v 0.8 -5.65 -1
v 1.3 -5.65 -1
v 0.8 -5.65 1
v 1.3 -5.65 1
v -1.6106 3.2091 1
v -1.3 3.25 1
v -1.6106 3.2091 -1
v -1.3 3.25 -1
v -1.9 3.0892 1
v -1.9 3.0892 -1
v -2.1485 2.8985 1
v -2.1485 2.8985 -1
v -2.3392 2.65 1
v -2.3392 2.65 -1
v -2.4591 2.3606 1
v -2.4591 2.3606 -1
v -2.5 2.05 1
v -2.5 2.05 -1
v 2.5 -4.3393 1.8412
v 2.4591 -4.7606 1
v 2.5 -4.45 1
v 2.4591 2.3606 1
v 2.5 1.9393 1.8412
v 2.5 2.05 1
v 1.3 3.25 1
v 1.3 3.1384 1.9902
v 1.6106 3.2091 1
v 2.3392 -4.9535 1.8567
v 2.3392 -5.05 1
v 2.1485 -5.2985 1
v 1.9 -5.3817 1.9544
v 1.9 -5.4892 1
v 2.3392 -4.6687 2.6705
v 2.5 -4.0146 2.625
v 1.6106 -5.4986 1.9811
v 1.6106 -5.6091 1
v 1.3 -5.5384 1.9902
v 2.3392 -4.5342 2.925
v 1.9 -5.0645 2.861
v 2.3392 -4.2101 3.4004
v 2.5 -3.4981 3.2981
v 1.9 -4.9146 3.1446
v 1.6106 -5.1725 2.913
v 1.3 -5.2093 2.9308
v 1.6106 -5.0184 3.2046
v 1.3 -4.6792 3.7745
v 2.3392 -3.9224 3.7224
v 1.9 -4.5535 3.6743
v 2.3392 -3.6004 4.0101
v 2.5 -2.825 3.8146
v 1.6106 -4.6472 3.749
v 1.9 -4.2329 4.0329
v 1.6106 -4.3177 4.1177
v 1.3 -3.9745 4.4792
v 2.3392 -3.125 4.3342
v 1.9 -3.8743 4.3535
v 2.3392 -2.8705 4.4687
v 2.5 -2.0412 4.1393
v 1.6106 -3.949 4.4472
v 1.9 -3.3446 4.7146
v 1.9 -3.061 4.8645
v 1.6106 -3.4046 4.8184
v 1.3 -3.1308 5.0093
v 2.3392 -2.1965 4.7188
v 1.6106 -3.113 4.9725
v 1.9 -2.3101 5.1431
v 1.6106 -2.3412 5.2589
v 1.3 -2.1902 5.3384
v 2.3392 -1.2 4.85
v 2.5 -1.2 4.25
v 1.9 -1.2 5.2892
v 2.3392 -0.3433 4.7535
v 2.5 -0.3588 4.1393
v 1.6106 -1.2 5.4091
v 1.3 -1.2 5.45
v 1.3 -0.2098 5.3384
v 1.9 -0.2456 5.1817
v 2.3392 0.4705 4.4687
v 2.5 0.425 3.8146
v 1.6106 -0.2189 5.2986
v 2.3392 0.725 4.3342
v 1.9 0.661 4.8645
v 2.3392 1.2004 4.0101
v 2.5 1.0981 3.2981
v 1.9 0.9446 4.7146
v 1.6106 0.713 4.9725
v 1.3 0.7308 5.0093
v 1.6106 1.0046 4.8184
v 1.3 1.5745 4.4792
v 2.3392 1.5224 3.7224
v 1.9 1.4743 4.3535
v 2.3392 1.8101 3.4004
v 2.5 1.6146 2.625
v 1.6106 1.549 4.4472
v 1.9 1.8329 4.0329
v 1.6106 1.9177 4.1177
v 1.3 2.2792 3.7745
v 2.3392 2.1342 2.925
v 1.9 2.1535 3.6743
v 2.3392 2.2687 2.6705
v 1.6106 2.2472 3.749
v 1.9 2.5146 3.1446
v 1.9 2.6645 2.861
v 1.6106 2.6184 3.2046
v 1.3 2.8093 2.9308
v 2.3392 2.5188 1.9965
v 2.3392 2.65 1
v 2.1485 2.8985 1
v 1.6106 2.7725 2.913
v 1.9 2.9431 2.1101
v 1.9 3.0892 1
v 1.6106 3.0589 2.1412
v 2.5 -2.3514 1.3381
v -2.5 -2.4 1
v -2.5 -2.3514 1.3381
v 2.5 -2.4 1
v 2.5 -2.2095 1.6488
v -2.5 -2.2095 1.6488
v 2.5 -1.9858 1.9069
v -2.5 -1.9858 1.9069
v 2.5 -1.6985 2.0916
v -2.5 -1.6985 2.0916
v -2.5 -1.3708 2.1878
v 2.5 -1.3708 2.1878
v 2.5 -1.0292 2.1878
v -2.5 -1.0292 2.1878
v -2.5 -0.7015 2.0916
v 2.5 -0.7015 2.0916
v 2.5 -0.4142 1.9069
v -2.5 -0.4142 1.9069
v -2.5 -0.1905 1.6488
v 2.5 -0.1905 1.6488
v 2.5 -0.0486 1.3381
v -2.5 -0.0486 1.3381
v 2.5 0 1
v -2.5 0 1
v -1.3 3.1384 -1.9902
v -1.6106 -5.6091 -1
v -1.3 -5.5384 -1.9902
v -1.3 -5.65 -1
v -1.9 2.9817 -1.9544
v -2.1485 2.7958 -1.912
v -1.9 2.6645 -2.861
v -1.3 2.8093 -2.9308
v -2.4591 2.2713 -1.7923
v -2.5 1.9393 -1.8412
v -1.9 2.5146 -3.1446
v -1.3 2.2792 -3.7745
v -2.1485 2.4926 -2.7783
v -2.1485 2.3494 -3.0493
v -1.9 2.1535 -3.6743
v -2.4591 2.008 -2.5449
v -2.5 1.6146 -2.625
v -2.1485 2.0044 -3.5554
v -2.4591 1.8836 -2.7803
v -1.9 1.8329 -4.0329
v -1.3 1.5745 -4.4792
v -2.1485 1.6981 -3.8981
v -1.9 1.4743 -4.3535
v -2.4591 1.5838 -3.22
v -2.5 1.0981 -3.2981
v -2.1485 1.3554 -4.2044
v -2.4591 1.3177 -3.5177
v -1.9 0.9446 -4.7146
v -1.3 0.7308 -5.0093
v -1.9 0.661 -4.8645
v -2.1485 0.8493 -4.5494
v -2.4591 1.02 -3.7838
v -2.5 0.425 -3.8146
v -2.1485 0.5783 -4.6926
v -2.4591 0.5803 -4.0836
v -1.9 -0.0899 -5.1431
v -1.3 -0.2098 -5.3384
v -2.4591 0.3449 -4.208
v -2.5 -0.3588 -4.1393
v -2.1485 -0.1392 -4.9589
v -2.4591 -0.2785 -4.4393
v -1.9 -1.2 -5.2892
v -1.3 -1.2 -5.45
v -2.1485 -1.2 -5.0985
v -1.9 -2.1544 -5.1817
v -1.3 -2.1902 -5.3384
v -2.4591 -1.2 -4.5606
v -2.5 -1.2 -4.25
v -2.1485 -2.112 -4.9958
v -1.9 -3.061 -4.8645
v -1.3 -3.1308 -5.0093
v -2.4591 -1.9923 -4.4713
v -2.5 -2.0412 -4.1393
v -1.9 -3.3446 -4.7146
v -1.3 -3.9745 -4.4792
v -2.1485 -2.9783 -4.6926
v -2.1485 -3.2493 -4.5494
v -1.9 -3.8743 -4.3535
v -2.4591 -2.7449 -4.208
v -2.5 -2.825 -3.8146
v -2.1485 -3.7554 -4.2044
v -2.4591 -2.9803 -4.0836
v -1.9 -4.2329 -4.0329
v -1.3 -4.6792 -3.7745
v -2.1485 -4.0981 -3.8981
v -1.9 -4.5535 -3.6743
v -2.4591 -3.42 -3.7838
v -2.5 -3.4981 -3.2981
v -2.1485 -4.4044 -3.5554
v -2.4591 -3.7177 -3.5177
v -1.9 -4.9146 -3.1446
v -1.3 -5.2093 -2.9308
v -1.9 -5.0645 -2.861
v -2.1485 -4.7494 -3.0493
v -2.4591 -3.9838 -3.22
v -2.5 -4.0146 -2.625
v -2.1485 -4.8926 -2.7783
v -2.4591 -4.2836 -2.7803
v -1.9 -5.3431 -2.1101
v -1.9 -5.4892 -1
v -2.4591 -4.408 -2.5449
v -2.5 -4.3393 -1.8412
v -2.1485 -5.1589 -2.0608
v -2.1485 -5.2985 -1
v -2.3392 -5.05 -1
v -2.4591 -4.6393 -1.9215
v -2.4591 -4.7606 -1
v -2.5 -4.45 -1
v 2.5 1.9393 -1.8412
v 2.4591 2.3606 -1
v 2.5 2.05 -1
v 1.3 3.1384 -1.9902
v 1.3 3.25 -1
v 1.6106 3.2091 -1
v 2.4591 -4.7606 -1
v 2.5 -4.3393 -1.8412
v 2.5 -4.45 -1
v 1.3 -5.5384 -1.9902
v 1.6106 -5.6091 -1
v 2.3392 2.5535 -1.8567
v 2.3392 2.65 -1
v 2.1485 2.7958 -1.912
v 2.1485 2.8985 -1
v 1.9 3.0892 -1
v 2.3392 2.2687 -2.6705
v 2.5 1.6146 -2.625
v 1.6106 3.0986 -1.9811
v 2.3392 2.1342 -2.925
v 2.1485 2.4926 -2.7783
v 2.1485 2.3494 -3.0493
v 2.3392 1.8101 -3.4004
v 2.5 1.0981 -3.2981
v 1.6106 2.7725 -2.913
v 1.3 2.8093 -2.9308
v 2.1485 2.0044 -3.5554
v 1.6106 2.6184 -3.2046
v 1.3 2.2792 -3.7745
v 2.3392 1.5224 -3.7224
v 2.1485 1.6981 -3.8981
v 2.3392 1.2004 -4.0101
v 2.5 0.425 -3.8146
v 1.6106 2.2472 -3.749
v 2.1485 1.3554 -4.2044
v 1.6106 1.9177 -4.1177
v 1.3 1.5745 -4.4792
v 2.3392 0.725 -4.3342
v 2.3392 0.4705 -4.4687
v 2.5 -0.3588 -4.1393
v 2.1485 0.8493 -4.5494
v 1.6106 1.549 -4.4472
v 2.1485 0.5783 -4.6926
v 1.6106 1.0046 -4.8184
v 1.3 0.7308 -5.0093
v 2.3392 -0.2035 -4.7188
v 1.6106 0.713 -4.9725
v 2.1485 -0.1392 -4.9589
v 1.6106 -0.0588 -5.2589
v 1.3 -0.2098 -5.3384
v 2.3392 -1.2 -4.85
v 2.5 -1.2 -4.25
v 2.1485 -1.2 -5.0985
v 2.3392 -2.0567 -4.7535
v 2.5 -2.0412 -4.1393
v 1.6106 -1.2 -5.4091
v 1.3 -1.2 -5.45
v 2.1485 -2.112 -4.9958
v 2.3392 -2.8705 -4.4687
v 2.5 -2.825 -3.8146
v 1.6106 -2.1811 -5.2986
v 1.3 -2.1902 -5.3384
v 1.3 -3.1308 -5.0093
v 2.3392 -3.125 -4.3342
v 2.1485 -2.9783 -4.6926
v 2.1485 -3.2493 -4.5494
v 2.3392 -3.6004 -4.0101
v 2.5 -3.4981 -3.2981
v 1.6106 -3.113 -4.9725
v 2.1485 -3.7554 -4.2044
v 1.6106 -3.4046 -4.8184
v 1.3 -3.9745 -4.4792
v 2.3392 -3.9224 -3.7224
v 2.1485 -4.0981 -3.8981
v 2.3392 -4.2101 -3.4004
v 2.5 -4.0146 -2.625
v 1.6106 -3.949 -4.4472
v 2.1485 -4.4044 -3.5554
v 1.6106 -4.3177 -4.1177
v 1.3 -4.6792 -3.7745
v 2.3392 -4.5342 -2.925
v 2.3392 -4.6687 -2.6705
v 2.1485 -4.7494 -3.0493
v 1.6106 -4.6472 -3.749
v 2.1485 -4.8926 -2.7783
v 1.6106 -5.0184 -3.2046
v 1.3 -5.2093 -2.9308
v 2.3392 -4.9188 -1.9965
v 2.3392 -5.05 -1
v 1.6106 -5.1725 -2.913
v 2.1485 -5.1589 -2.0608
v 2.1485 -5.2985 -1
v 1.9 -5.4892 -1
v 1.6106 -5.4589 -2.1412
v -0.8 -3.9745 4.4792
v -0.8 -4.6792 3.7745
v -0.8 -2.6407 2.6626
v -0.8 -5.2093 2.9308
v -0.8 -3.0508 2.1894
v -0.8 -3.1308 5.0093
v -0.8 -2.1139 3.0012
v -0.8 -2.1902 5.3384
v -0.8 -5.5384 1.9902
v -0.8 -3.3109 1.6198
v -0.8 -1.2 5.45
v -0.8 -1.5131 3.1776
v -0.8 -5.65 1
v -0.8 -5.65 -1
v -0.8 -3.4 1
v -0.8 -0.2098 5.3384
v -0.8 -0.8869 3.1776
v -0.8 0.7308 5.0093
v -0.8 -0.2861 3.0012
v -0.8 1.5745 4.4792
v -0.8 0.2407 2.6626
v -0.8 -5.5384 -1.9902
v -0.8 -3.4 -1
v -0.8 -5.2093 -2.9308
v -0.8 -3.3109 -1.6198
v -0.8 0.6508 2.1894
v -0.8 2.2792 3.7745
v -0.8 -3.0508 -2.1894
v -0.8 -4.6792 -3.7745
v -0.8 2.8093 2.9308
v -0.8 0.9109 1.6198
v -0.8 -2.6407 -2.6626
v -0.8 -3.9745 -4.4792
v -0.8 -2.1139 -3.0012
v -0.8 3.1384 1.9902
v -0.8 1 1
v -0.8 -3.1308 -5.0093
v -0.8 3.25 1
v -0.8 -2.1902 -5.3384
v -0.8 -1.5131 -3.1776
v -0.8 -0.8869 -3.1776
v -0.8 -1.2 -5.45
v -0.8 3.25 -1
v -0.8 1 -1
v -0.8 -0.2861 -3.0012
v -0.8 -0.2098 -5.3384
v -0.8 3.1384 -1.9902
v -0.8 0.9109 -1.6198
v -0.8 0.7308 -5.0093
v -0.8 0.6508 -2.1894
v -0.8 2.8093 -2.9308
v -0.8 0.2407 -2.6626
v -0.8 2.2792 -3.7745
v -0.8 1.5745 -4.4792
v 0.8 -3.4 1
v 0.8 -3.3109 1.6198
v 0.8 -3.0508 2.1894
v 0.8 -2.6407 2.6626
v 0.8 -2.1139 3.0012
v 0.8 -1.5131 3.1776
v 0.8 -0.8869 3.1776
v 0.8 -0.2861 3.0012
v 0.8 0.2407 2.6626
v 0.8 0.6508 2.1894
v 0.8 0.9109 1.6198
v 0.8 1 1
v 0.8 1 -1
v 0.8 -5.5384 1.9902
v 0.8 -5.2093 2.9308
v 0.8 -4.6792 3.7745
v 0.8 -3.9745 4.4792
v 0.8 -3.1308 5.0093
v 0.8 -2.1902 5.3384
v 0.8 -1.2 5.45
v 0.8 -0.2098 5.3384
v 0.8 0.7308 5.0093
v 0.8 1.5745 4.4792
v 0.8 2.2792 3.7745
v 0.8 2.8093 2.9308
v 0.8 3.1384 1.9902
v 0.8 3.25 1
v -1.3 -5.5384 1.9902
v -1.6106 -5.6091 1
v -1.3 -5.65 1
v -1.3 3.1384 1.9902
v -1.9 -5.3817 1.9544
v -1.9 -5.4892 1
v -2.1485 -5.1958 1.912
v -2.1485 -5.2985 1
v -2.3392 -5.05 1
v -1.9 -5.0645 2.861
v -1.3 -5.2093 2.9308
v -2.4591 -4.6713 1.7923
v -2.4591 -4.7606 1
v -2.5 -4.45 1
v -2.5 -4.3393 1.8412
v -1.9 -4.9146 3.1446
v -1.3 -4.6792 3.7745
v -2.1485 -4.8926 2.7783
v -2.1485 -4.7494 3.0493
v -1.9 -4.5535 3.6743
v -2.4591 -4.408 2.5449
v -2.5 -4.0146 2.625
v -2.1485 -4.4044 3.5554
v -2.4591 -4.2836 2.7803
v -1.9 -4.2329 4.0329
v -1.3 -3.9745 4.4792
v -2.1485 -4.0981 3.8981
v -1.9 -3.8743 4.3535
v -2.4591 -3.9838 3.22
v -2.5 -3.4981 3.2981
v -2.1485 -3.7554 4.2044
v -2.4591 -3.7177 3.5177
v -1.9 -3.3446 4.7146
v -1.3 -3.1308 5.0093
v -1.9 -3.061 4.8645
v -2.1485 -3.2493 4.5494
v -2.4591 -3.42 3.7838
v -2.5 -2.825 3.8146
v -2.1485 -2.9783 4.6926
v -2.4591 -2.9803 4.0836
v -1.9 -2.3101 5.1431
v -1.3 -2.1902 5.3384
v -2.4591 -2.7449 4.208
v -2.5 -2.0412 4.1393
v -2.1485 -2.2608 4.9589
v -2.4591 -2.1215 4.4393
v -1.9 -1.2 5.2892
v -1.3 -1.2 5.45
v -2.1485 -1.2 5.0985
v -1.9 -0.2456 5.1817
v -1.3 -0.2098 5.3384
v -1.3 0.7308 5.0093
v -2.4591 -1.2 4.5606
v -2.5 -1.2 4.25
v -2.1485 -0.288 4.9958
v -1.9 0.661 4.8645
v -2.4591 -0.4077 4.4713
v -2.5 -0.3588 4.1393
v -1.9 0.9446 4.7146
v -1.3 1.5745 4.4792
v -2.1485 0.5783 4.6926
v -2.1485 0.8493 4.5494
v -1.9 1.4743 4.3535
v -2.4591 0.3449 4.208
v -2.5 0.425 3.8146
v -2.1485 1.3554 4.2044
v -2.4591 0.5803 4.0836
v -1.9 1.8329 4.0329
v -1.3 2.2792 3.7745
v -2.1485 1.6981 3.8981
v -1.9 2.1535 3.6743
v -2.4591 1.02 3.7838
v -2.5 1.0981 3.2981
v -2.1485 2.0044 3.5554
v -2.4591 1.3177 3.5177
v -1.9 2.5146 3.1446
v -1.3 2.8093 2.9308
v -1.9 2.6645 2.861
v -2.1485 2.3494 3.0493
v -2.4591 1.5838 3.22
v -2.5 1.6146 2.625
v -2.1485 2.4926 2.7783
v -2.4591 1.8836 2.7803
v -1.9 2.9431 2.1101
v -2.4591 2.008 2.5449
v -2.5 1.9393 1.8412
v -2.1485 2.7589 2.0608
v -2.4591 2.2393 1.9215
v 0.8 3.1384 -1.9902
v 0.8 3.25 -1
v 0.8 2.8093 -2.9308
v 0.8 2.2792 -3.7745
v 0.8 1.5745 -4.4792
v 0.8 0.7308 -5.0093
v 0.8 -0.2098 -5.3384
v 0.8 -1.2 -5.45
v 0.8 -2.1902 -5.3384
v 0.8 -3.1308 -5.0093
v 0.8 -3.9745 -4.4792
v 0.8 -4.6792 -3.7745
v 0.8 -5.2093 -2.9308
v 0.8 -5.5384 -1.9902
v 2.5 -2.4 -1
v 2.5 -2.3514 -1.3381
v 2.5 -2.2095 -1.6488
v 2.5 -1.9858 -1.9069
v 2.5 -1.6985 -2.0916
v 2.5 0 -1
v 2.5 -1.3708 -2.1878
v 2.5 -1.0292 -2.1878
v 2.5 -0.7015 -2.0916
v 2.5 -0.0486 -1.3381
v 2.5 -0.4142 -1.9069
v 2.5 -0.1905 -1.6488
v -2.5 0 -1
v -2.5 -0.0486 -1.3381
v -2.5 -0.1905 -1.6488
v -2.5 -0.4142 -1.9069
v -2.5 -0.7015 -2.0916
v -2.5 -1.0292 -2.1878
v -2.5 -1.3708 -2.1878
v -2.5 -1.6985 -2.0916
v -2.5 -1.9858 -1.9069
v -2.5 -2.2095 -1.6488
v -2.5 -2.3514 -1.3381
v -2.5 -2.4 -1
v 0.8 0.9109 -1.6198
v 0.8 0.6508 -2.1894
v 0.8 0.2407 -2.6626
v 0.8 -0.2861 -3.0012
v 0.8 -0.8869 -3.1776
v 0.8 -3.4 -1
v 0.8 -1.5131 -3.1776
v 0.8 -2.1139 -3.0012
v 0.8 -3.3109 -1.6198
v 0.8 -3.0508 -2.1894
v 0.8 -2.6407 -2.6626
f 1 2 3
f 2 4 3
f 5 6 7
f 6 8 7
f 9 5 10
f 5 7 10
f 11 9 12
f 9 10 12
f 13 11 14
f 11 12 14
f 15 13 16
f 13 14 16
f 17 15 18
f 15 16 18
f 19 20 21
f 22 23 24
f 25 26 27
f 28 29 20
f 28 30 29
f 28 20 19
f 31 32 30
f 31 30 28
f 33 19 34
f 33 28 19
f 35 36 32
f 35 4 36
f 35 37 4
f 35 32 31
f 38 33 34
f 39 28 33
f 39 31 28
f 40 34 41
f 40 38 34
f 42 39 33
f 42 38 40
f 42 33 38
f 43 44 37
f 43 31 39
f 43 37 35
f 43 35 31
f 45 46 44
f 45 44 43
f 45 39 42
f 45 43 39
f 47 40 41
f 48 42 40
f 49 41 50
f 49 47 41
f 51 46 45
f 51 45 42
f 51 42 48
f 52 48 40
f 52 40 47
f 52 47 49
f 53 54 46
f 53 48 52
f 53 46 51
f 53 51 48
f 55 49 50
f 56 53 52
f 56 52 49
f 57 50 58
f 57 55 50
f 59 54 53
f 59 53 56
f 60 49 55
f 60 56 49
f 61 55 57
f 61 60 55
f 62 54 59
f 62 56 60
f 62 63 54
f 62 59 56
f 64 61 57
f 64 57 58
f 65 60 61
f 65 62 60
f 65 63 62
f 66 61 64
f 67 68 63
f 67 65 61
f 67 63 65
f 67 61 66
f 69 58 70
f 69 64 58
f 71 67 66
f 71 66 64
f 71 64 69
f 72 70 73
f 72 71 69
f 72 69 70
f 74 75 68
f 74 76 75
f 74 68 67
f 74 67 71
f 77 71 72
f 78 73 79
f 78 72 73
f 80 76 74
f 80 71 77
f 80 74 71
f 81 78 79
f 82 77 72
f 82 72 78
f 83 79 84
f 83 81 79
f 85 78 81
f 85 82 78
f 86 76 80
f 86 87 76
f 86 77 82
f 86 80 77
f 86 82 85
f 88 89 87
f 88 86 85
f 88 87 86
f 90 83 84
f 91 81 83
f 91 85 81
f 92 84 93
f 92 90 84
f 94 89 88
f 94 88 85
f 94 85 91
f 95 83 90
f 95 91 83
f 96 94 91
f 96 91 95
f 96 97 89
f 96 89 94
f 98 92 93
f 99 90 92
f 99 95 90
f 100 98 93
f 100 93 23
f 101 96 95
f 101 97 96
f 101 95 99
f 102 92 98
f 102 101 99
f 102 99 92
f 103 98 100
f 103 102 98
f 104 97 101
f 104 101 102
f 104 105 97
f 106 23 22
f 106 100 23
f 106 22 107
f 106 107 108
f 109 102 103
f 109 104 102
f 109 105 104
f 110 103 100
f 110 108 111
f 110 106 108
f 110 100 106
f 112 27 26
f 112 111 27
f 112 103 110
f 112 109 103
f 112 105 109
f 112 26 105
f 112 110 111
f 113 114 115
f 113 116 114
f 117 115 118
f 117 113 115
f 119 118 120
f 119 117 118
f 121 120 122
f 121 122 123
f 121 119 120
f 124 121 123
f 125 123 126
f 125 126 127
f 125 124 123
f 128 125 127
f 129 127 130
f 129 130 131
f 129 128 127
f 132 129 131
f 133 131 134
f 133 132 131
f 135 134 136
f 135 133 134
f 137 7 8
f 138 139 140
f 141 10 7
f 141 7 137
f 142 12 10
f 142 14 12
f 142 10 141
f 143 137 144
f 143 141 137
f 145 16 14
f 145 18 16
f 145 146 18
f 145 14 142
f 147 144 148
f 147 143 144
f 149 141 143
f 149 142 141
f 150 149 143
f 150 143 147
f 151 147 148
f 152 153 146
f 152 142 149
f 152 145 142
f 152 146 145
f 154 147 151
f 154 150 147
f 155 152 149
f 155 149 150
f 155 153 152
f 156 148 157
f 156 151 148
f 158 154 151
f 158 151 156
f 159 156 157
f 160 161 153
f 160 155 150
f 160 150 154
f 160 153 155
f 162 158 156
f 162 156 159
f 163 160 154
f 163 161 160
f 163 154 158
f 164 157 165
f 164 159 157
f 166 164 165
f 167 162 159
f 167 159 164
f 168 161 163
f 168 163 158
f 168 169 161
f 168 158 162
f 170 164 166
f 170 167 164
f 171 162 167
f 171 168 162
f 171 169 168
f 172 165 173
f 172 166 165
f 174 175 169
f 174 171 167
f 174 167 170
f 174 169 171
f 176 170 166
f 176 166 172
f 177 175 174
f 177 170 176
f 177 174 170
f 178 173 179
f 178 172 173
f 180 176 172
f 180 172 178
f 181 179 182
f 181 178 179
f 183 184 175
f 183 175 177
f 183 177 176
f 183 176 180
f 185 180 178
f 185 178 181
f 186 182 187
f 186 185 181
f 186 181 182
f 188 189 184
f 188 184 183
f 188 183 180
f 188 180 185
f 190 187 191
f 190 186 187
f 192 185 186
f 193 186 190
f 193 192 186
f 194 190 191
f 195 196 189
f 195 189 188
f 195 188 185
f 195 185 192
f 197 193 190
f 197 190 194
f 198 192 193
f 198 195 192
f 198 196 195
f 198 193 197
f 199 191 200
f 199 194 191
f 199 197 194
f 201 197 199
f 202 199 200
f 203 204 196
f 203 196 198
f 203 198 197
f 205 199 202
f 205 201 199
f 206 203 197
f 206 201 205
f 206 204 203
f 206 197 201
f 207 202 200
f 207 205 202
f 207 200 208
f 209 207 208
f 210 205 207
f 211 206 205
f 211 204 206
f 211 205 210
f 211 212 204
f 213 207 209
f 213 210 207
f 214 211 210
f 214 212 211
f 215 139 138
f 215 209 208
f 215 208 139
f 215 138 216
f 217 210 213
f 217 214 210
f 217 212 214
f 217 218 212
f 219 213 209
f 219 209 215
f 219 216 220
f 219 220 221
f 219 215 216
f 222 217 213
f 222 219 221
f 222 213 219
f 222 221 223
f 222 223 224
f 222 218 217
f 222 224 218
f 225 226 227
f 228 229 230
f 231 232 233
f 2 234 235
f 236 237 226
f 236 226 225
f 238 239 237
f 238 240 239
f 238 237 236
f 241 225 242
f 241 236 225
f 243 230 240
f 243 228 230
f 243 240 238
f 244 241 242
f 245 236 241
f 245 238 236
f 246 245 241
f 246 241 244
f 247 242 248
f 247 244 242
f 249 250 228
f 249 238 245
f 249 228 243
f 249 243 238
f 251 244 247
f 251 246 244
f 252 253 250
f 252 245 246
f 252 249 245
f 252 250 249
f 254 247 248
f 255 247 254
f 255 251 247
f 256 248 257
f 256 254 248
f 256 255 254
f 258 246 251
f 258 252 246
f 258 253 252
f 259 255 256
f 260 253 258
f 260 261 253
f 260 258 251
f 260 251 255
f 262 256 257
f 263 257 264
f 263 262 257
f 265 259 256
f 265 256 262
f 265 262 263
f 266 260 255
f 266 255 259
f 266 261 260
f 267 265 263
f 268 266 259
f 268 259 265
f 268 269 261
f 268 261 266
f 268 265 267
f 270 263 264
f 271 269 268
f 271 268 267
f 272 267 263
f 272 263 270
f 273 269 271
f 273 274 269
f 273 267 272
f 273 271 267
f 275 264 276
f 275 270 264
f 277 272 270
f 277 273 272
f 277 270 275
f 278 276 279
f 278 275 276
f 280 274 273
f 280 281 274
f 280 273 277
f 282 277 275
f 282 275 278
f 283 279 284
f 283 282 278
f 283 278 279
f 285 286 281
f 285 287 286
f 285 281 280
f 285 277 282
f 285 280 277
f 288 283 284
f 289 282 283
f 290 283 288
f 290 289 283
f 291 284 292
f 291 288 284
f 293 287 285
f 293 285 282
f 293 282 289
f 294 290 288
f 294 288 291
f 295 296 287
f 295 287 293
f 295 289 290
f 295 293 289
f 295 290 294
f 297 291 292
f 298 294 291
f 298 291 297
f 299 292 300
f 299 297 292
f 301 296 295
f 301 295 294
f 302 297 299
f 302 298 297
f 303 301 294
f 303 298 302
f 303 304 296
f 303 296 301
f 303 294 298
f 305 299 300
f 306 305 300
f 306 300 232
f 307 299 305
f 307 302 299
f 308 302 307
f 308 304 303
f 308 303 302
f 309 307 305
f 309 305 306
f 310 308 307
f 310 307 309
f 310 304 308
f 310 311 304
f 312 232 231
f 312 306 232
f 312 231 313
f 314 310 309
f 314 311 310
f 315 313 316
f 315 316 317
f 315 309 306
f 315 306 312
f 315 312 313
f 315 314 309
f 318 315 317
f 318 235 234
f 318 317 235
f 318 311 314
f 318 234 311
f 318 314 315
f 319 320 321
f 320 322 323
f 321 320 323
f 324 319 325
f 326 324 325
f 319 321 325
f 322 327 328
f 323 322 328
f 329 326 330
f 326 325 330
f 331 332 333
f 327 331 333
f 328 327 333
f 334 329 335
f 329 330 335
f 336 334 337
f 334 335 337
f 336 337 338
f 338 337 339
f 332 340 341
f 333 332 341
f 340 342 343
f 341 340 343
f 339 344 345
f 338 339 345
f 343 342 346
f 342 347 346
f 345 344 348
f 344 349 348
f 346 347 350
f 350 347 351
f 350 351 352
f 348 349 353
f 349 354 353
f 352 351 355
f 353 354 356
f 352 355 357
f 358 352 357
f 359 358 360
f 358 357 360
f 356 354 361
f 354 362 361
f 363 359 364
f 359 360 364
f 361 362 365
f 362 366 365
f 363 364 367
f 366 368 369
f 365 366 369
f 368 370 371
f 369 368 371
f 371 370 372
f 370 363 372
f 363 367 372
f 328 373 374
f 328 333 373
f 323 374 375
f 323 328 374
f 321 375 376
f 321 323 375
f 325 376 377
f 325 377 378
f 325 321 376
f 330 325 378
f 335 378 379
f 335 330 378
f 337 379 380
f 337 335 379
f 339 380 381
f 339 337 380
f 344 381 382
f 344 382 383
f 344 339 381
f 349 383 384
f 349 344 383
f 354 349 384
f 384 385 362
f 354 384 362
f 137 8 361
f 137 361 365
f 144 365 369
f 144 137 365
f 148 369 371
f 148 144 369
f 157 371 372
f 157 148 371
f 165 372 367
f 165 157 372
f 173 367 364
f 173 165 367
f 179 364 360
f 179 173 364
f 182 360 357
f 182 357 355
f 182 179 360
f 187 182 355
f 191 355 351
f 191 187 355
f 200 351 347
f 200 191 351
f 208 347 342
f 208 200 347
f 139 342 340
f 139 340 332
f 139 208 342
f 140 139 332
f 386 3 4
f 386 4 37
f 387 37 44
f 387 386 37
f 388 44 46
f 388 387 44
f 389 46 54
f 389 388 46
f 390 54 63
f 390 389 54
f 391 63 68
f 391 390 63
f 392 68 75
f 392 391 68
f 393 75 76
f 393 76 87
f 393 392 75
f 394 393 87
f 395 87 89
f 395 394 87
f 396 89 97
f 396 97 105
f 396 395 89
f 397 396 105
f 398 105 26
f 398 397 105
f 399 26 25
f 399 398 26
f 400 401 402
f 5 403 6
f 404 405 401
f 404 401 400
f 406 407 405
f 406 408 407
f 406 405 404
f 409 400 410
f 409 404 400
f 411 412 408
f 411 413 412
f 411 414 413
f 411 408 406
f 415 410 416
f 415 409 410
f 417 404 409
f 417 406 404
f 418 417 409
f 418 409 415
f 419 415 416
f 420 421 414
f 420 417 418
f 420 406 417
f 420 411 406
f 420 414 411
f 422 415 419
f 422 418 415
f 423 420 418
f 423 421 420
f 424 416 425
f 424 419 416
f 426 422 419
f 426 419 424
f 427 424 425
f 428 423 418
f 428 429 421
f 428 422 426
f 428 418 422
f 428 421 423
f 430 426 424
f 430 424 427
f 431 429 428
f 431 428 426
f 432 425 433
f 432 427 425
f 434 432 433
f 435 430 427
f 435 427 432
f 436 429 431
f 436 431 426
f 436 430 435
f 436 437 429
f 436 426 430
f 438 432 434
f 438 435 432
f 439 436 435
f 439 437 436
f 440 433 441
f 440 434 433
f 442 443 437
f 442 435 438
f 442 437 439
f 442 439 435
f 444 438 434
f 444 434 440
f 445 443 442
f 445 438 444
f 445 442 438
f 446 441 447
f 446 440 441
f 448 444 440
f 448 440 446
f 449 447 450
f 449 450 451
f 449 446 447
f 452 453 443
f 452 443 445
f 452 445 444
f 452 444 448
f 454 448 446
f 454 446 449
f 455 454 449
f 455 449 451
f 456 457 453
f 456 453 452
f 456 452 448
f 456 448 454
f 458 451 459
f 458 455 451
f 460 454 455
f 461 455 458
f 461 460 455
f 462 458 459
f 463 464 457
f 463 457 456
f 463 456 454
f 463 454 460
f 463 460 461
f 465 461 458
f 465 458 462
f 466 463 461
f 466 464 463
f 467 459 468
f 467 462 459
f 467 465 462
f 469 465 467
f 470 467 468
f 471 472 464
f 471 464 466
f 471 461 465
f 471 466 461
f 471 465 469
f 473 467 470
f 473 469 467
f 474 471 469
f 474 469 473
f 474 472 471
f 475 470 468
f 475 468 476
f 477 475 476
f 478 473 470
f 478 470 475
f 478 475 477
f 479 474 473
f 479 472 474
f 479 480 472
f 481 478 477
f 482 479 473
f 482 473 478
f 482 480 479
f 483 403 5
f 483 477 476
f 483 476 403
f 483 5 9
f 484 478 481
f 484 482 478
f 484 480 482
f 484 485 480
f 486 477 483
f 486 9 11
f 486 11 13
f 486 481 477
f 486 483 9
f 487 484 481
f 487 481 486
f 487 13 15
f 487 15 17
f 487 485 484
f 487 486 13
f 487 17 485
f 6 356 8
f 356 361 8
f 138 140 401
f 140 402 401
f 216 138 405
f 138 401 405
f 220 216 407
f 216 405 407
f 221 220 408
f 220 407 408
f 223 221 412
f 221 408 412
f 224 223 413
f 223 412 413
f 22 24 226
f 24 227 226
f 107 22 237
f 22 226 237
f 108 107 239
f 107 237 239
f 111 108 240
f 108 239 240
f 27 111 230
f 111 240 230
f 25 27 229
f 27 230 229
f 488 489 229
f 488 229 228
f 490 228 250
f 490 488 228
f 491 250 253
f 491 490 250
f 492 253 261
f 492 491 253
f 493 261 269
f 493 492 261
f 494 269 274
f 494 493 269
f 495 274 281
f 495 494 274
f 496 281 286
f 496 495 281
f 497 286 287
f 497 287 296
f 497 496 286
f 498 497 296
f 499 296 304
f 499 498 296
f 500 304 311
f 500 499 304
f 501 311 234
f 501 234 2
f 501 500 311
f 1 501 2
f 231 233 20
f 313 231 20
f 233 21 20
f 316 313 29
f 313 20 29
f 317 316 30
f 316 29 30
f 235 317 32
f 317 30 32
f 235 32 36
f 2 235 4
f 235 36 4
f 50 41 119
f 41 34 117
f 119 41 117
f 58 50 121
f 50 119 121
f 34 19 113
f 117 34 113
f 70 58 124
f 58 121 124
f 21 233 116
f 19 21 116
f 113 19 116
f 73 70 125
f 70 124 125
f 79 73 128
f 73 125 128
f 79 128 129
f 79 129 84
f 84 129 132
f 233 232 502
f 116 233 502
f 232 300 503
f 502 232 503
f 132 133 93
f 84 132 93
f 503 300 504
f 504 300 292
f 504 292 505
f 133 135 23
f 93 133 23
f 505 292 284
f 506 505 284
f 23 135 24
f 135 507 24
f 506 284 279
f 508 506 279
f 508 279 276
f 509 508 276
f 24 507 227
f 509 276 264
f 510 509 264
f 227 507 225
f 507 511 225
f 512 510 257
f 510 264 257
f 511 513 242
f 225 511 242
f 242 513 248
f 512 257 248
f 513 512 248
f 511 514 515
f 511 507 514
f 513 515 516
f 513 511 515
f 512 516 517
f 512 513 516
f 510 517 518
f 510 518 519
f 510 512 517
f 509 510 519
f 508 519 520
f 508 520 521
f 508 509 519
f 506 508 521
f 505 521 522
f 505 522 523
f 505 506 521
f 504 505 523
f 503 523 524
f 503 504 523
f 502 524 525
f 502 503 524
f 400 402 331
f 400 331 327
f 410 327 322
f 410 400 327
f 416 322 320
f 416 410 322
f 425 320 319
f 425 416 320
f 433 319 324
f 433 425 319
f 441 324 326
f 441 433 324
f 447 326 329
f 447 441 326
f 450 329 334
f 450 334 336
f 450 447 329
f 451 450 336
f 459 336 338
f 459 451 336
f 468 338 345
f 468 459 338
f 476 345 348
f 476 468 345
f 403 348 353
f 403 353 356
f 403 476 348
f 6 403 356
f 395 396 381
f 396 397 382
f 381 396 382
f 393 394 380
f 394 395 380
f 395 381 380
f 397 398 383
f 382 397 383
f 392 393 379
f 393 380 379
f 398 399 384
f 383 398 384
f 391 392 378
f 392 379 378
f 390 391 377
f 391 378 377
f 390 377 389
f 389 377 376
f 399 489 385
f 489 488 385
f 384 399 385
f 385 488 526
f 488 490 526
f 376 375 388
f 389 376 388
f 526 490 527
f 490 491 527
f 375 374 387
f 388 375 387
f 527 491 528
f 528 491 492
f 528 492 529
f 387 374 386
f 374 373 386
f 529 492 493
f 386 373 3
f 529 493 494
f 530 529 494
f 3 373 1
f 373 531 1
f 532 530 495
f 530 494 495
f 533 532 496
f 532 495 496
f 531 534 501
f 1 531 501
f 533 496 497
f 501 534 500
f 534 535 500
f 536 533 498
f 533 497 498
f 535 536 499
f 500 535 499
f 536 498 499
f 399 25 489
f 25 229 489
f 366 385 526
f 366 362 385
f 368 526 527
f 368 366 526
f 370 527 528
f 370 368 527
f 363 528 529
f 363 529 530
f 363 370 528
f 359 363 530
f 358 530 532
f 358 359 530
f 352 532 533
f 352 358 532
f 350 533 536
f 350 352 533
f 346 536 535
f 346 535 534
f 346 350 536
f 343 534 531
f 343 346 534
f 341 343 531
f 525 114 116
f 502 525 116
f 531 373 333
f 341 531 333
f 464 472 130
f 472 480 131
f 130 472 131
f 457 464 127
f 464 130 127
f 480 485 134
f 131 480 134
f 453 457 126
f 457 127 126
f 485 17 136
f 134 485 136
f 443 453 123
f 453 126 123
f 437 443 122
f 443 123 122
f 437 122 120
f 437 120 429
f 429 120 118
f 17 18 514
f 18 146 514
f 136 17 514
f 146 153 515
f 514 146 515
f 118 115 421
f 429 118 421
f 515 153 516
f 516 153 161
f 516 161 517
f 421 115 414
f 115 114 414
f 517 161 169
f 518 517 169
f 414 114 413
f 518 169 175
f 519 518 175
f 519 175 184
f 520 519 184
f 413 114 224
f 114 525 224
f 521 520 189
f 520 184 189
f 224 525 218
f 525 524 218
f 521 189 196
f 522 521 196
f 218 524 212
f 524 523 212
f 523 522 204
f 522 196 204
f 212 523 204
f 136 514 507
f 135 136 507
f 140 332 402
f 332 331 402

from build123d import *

# Parameters (mm, degrees)
FILLET_1_R = 1.2


with BuildPart() as part:
    # По траектории2: sweep along a path in Эскиз3
    with BuildLine(Plane(origin=(0, 0, 0), x_dir=(0, 0, -1), z_dir=(1, 0, 0))) as sweep_2_path:
        Line((-1, 0), (1, 0))
        ThreePointArc((1, 0), (2.2, -1.2), (1, -2.4))
        Line((1, -2.4), (-1, -2.4))
        ThreePointArc((-1, -2.4), (-2.2, -1.2), (-1, 0))
    # Эскиз1 → По траектории2 (sweep)
    with BuildSketch(Plane.XY):
        Polygon((-0.8, 1), (0.8, 1), (0.8, 3.25), (2.5, 3.25), (2.5, 0), (-2.5, 0), (-2.5, 3.25), (-0.8, 3.25), align=None)
    sweep(path=sweep_2_path.line)

    # Скругление1
    fillet_1_edges = [part.edges().sort_by_distance(p)[0] for p in [
        (2.5, 3.25, 0),
        (-2.5, 3.25, 0),
        (2.5, -1.2, 5.45),
        (-2.5, -1.2, 5.45),
        (2.5, -5.65, 0),
        (-2.5, -5.65, 0),
        (2.5, -1.2, -5.45),
        (-2.5, -1.2, -5.45),
    ]]
    fillet(fillet_1_edges, radius=FILLET_1_R)


solid = part.part
